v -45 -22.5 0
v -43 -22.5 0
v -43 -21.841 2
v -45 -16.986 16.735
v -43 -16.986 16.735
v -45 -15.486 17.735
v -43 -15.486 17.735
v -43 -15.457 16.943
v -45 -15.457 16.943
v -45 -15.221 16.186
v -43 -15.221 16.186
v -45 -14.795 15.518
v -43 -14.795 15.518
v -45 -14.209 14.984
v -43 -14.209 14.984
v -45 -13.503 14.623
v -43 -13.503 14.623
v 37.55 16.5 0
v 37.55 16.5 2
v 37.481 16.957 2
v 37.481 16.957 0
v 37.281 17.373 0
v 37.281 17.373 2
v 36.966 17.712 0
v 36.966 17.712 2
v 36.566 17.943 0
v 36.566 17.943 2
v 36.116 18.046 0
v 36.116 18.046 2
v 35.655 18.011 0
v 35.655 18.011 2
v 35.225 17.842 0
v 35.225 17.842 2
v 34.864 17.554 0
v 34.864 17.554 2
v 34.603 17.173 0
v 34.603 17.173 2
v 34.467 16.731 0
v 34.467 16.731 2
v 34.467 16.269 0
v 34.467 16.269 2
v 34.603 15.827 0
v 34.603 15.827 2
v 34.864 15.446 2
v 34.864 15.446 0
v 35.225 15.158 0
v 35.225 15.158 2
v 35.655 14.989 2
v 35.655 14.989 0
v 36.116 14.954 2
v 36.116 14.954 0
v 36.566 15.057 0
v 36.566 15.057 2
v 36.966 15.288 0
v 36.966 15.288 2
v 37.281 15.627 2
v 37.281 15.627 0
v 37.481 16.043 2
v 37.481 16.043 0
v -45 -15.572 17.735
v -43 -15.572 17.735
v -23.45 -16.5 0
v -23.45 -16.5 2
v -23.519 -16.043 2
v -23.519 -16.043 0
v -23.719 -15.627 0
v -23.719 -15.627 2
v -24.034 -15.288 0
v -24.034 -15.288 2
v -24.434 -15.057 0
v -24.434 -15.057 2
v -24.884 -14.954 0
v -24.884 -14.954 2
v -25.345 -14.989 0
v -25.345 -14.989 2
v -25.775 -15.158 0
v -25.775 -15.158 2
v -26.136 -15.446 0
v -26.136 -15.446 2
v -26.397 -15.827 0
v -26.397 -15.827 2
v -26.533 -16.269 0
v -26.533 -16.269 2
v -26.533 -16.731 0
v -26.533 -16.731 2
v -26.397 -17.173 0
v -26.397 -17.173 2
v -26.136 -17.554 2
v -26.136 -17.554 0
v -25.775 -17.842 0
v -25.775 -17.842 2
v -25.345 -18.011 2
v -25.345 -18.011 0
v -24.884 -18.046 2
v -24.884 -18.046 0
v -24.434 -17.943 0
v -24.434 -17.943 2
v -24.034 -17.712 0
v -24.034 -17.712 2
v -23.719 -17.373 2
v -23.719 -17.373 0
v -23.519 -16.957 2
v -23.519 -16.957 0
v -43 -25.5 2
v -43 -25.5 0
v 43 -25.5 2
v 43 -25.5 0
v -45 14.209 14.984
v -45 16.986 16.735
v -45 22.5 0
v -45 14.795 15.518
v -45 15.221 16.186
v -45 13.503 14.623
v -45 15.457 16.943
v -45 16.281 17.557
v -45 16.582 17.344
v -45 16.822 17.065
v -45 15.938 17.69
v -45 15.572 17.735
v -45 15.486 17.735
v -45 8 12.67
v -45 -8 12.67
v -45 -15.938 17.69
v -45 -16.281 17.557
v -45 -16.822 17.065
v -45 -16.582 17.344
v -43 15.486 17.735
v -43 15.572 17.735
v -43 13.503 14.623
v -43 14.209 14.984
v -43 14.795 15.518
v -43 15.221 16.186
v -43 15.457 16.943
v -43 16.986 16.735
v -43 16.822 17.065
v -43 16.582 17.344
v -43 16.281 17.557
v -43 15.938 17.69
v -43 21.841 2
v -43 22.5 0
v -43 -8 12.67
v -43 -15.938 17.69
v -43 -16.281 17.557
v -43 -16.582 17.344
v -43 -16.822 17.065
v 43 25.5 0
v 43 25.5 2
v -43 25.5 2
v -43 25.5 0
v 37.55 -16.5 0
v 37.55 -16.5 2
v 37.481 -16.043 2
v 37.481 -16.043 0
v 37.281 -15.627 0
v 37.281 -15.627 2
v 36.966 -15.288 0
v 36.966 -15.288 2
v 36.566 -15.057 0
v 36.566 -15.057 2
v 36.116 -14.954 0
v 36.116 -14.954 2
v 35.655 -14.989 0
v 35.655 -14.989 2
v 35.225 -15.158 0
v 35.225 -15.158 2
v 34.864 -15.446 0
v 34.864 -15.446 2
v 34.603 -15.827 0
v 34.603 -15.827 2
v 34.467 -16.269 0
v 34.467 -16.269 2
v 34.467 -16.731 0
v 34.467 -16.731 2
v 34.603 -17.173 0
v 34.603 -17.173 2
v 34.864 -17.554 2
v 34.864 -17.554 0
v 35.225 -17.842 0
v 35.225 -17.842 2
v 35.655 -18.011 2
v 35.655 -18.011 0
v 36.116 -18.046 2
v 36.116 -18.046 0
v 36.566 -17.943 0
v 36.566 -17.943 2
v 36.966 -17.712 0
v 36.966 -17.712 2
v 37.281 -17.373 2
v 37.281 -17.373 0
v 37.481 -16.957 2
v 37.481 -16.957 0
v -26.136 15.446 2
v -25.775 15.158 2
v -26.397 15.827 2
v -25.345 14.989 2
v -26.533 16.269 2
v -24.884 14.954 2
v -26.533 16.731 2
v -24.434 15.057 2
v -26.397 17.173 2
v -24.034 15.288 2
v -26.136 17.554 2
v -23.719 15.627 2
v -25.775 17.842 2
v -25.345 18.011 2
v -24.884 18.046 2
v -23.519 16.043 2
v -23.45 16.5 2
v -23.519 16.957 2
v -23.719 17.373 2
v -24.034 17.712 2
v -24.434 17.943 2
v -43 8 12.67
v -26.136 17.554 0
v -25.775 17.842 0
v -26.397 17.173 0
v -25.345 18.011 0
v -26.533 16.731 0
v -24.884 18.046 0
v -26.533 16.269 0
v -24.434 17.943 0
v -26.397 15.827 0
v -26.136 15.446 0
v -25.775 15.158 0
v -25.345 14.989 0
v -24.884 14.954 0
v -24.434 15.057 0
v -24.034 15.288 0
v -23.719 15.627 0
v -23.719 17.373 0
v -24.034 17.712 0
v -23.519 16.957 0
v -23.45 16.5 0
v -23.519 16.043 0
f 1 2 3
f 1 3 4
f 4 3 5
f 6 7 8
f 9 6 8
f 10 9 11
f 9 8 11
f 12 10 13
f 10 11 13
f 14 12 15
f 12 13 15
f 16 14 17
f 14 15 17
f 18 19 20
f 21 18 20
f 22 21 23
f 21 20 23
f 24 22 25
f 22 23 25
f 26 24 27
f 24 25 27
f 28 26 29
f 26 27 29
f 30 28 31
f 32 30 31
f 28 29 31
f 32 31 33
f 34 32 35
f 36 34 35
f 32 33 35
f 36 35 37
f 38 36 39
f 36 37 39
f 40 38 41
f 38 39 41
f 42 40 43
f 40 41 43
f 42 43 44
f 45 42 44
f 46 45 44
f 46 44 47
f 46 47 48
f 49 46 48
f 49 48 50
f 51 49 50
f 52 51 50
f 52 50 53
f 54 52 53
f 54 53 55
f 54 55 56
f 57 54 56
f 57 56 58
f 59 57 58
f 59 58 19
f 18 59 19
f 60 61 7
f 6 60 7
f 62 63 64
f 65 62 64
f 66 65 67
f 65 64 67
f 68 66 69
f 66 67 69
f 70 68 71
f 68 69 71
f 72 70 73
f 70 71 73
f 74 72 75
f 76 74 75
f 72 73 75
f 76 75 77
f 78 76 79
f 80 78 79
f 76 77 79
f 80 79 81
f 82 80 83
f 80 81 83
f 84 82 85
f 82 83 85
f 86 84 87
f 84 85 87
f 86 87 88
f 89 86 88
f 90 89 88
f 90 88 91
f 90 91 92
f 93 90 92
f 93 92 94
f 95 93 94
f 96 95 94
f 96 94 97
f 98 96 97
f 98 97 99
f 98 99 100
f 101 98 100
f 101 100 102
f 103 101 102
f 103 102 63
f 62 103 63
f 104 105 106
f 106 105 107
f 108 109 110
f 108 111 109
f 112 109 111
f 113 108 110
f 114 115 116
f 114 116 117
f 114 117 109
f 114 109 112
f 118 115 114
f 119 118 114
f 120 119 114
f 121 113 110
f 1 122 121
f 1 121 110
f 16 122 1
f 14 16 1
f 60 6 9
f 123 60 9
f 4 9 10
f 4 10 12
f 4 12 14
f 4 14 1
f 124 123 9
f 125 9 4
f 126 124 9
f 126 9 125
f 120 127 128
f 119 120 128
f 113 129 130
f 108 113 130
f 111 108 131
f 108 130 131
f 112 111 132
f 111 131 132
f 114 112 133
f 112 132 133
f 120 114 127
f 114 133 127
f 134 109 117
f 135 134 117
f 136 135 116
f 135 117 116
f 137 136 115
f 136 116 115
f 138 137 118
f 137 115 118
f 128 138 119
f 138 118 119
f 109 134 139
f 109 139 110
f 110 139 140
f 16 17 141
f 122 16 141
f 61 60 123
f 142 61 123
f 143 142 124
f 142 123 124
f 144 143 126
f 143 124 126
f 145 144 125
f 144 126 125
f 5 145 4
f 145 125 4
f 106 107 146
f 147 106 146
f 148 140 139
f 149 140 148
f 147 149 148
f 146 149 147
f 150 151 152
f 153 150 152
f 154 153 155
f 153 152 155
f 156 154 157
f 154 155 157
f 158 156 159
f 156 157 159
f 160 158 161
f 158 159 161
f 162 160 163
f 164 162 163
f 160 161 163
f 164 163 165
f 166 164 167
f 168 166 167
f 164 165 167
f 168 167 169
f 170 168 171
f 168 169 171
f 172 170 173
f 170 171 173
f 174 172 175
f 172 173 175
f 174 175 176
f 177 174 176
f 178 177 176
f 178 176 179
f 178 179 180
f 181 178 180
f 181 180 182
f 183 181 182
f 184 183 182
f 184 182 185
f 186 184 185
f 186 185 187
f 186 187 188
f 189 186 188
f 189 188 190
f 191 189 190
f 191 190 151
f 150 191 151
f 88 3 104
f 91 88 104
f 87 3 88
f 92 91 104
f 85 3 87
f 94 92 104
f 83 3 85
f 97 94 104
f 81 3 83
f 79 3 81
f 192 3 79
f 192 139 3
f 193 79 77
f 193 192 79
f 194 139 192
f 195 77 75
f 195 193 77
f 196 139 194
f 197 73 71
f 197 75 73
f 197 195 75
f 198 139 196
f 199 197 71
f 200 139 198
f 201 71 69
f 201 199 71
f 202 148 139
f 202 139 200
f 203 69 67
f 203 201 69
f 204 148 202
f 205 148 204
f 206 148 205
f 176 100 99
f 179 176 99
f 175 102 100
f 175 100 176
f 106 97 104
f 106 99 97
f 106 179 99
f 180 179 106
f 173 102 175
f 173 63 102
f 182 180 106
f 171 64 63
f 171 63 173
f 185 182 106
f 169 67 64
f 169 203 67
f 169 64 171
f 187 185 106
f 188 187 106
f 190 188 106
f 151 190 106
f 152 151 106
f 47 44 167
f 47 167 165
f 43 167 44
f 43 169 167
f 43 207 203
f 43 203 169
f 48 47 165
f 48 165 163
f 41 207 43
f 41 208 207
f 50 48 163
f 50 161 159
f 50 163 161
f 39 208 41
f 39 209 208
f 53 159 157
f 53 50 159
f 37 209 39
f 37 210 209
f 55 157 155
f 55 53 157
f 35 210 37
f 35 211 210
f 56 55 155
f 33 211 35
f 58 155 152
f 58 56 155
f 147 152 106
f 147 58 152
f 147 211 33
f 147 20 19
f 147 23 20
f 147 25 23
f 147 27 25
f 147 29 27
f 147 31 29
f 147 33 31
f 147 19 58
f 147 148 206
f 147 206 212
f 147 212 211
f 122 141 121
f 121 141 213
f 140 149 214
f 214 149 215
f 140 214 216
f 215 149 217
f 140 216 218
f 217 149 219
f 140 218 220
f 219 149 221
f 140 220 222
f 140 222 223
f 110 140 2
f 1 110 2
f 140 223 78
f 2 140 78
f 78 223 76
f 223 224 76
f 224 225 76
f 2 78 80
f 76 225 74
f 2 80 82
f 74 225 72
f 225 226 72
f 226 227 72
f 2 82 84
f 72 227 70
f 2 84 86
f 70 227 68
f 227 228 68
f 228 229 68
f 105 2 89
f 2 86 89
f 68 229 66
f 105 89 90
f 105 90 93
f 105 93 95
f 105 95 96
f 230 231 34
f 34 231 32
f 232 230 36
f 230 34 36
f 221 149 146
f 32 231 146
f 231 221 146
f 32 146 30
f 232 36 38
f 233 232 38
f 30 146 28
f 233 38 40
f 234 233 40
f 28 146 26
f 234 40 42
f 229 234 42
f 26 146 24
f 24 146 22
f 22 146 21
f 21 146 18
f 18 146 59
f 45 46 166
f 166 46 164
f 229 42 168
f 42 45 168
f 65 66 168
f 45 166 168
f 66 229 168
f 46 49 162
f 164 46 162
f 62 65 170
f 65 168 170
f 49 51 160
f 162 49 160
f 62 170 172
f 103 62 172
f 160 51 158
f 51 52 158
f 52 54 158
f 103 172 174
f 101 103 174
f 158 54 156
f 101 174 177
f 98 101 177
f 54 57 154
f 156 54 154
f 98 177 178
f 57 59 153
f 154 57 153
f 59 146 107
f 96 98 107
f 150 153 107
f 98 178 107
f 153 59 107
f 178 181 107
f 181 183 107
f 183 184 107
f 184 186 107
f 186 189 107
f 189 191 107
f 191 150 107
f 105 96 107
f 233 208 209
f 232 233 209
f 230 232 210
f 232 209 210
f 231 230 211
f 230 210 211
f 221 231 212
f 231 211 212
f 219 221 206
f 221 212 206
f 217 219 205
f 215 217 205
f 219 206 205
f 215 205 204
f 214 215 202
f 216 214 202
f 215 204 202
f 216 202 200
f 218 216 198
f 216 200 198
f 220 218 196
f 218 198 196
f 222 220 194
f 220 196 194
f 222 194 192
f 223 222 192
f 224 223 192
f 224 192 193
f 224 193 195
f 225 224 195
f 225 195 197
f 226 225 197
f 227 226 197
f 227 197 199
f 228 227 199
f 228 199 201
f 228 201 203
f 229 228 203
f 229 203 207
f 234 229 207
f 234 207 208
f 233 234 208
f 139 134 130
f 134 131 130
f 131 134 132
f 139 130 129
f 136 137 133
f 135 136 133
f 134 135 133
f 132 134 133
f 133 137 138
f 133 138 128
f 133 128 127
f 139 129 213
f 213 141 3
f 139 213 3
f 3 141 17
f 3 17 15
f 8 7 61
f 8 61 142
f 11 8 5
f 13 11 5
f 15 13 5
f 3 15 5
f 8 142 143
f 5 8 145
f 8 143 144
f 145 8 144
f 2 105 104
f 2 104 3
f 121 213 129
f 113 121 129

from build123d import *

# Parameters (mm, degrees)
F0_W        = 86
F0_H        = 51
F1_DEPTH    = 2
F3_R        = 1.55
F4_DEPTH    = 25.4
F5_DEPTH    = 2
F6_T1_DEPTH = 9.0710678119


# Not quite as in the source:
# - a fillet or chamfer that OpenCascade refuses, or shapes differently, is made with other operations: its cross-section is extruded or revolved along the edge and cut away or added


with BuildPart() as f1:
    # F0 (on Top) → F1 (new body)
    with BuildSketch(Plane.XY):
        Rectangle(F0_W, F0_H)
    extrude(amount=F1_DEPTH)

    # F3 (on face) → F4 (cut)
    with BuildSketch(Plane.XY.offset(2)):
        with Locations((-25, 16.5)):
            Circle(F3_R)
        with Locations((-25, -16.5)):
            Circle(F3_R)
        with Locations((36, 16.5)):
            Circle(F3_R)
        with Locations((36, -16.5)):
            Circle(F3_R)
    extrude(amount=-F4_DEPTH, mode=Mode.SUBTRACT)

    # F2 (on face) → F5 (join)
    with BuildSketch(Plane(origin=(-43, 0, 0), x_dir=(0, -1, 0), z_dir=(-1, 0, 0))):
        with BuildLine():
            Line((8, 12.6704787835), (0, 12.6704787835))
            Line((0, 12.6704787835), (-8, 12.6704787835))
            Line((-8, 12.6704787835), (-13.5029918403, 14.6226324313))
            ThreePointArc((-13.5029918403, 14.6226324313), (-15.0300310094, 15.8378762171), (-15.4863987014, 17.7353468))
            Line((-15.4863987014, 17.7353468), (-16.9863987014, 17.7353468))
            Line((-16.9863987014, 17.7353468), (-16.9863987014, 16.7353468))
            Line((-16.9863987014, 16.7353468), (-22.5, 0))
            Line((-22.5, 0), (22.5, 0))
            Line((22.5, 0), (16.9863987014, 16.7353468))
            Line((16.9863987014, 16.7353468), (16.9863987014, 17.7353468))
            Line((16.9863987014, 17.7353468), (15.4863987014, 17.7353468))
            ThreePointArc((15.4863987014, 17.7353468), (15.0300310094, 15.8378762171), (13.5029918403, 14.6226324313))
            Line((13.5029918403, 14.6226324313), (8, 12.6704787835))
        make_face()
        with BuildLine():
            Line((8, 12.6704787835), (0, 12.6704787835))
            Line((0, 12.6704787835), (-8, 12.6704787835))
            Line((-8, 12.6704787835), (-13.5029918403, 14.6226324313))
            ThreePointArc((-13.5029918403, 14.6226324313), (-15.0300310094, 15.8378762171), (-15.4863987014, 17.7353468))
            Line((-15.4863987014, 17.7353468), (-16.9863987014, 17.7353468))
            Line((-16.9863987014, 17.7353468), (-16.9863987014, 16.7353468))
            Line((-16.9863987014, 16.7353468), (-21.8410831141, 2))
            Line((-21.8410831141, 2), (21.8410831141, 2))
            Line((21.8410831141, 2), (16.9863987014, 16.7353468))
            Line((16.9863987014, 16.7353468), (16.9863987014, 17.7353468))
            Line((16.9863987014, 17.7353468), (15.4863987014, 17.7353468))
            ThreePointArc((15.4863987014, 17.7353468), (15.0300310094, 15.8378762171), (13.5029918403, 14.6226324313))
            Line((13.5029918403, 14.6226324313), (8, 12.6704787835))
        make_face()
    extrude(amount=F5_DEPTH)

    # F6: fillet of radius 1.5 on 2 edges, made by hand

    # F6_s2 → F6_t1 (cut)
    with BuildSketch(Plane.YZ.offset(-48.5355339059)):
        with BuildLine():
            ThreePointArc((-15.572185139, 17.7353468), (-16.4382105428, 17.4600916714), (-16.9863987014, 16.7353468))
            Line((-16.9863987014, 16.7353468), (-16.9863987014, 17.7353468))
            Line((-16.9863987014, 17.7353468), (-15.572185139, 17.7353468))
        make_face()
        with BuildLine():
            ThreePointArc((16.9863987014, 16.7353468), (16.4382105428, 17.4600916714), (15.572185139, 17.7353468))
            Line((15.572185139, 17.7353468), (16.9863987014, 17.7353468))
            Line((16.9863987014, 17.7353468), (16.9863987014, 16.7353468))
        make_face()
    extrude(amount=F6_T1_DEPTH, mode=Mode.SUBTRACT)


solid = f1.part
